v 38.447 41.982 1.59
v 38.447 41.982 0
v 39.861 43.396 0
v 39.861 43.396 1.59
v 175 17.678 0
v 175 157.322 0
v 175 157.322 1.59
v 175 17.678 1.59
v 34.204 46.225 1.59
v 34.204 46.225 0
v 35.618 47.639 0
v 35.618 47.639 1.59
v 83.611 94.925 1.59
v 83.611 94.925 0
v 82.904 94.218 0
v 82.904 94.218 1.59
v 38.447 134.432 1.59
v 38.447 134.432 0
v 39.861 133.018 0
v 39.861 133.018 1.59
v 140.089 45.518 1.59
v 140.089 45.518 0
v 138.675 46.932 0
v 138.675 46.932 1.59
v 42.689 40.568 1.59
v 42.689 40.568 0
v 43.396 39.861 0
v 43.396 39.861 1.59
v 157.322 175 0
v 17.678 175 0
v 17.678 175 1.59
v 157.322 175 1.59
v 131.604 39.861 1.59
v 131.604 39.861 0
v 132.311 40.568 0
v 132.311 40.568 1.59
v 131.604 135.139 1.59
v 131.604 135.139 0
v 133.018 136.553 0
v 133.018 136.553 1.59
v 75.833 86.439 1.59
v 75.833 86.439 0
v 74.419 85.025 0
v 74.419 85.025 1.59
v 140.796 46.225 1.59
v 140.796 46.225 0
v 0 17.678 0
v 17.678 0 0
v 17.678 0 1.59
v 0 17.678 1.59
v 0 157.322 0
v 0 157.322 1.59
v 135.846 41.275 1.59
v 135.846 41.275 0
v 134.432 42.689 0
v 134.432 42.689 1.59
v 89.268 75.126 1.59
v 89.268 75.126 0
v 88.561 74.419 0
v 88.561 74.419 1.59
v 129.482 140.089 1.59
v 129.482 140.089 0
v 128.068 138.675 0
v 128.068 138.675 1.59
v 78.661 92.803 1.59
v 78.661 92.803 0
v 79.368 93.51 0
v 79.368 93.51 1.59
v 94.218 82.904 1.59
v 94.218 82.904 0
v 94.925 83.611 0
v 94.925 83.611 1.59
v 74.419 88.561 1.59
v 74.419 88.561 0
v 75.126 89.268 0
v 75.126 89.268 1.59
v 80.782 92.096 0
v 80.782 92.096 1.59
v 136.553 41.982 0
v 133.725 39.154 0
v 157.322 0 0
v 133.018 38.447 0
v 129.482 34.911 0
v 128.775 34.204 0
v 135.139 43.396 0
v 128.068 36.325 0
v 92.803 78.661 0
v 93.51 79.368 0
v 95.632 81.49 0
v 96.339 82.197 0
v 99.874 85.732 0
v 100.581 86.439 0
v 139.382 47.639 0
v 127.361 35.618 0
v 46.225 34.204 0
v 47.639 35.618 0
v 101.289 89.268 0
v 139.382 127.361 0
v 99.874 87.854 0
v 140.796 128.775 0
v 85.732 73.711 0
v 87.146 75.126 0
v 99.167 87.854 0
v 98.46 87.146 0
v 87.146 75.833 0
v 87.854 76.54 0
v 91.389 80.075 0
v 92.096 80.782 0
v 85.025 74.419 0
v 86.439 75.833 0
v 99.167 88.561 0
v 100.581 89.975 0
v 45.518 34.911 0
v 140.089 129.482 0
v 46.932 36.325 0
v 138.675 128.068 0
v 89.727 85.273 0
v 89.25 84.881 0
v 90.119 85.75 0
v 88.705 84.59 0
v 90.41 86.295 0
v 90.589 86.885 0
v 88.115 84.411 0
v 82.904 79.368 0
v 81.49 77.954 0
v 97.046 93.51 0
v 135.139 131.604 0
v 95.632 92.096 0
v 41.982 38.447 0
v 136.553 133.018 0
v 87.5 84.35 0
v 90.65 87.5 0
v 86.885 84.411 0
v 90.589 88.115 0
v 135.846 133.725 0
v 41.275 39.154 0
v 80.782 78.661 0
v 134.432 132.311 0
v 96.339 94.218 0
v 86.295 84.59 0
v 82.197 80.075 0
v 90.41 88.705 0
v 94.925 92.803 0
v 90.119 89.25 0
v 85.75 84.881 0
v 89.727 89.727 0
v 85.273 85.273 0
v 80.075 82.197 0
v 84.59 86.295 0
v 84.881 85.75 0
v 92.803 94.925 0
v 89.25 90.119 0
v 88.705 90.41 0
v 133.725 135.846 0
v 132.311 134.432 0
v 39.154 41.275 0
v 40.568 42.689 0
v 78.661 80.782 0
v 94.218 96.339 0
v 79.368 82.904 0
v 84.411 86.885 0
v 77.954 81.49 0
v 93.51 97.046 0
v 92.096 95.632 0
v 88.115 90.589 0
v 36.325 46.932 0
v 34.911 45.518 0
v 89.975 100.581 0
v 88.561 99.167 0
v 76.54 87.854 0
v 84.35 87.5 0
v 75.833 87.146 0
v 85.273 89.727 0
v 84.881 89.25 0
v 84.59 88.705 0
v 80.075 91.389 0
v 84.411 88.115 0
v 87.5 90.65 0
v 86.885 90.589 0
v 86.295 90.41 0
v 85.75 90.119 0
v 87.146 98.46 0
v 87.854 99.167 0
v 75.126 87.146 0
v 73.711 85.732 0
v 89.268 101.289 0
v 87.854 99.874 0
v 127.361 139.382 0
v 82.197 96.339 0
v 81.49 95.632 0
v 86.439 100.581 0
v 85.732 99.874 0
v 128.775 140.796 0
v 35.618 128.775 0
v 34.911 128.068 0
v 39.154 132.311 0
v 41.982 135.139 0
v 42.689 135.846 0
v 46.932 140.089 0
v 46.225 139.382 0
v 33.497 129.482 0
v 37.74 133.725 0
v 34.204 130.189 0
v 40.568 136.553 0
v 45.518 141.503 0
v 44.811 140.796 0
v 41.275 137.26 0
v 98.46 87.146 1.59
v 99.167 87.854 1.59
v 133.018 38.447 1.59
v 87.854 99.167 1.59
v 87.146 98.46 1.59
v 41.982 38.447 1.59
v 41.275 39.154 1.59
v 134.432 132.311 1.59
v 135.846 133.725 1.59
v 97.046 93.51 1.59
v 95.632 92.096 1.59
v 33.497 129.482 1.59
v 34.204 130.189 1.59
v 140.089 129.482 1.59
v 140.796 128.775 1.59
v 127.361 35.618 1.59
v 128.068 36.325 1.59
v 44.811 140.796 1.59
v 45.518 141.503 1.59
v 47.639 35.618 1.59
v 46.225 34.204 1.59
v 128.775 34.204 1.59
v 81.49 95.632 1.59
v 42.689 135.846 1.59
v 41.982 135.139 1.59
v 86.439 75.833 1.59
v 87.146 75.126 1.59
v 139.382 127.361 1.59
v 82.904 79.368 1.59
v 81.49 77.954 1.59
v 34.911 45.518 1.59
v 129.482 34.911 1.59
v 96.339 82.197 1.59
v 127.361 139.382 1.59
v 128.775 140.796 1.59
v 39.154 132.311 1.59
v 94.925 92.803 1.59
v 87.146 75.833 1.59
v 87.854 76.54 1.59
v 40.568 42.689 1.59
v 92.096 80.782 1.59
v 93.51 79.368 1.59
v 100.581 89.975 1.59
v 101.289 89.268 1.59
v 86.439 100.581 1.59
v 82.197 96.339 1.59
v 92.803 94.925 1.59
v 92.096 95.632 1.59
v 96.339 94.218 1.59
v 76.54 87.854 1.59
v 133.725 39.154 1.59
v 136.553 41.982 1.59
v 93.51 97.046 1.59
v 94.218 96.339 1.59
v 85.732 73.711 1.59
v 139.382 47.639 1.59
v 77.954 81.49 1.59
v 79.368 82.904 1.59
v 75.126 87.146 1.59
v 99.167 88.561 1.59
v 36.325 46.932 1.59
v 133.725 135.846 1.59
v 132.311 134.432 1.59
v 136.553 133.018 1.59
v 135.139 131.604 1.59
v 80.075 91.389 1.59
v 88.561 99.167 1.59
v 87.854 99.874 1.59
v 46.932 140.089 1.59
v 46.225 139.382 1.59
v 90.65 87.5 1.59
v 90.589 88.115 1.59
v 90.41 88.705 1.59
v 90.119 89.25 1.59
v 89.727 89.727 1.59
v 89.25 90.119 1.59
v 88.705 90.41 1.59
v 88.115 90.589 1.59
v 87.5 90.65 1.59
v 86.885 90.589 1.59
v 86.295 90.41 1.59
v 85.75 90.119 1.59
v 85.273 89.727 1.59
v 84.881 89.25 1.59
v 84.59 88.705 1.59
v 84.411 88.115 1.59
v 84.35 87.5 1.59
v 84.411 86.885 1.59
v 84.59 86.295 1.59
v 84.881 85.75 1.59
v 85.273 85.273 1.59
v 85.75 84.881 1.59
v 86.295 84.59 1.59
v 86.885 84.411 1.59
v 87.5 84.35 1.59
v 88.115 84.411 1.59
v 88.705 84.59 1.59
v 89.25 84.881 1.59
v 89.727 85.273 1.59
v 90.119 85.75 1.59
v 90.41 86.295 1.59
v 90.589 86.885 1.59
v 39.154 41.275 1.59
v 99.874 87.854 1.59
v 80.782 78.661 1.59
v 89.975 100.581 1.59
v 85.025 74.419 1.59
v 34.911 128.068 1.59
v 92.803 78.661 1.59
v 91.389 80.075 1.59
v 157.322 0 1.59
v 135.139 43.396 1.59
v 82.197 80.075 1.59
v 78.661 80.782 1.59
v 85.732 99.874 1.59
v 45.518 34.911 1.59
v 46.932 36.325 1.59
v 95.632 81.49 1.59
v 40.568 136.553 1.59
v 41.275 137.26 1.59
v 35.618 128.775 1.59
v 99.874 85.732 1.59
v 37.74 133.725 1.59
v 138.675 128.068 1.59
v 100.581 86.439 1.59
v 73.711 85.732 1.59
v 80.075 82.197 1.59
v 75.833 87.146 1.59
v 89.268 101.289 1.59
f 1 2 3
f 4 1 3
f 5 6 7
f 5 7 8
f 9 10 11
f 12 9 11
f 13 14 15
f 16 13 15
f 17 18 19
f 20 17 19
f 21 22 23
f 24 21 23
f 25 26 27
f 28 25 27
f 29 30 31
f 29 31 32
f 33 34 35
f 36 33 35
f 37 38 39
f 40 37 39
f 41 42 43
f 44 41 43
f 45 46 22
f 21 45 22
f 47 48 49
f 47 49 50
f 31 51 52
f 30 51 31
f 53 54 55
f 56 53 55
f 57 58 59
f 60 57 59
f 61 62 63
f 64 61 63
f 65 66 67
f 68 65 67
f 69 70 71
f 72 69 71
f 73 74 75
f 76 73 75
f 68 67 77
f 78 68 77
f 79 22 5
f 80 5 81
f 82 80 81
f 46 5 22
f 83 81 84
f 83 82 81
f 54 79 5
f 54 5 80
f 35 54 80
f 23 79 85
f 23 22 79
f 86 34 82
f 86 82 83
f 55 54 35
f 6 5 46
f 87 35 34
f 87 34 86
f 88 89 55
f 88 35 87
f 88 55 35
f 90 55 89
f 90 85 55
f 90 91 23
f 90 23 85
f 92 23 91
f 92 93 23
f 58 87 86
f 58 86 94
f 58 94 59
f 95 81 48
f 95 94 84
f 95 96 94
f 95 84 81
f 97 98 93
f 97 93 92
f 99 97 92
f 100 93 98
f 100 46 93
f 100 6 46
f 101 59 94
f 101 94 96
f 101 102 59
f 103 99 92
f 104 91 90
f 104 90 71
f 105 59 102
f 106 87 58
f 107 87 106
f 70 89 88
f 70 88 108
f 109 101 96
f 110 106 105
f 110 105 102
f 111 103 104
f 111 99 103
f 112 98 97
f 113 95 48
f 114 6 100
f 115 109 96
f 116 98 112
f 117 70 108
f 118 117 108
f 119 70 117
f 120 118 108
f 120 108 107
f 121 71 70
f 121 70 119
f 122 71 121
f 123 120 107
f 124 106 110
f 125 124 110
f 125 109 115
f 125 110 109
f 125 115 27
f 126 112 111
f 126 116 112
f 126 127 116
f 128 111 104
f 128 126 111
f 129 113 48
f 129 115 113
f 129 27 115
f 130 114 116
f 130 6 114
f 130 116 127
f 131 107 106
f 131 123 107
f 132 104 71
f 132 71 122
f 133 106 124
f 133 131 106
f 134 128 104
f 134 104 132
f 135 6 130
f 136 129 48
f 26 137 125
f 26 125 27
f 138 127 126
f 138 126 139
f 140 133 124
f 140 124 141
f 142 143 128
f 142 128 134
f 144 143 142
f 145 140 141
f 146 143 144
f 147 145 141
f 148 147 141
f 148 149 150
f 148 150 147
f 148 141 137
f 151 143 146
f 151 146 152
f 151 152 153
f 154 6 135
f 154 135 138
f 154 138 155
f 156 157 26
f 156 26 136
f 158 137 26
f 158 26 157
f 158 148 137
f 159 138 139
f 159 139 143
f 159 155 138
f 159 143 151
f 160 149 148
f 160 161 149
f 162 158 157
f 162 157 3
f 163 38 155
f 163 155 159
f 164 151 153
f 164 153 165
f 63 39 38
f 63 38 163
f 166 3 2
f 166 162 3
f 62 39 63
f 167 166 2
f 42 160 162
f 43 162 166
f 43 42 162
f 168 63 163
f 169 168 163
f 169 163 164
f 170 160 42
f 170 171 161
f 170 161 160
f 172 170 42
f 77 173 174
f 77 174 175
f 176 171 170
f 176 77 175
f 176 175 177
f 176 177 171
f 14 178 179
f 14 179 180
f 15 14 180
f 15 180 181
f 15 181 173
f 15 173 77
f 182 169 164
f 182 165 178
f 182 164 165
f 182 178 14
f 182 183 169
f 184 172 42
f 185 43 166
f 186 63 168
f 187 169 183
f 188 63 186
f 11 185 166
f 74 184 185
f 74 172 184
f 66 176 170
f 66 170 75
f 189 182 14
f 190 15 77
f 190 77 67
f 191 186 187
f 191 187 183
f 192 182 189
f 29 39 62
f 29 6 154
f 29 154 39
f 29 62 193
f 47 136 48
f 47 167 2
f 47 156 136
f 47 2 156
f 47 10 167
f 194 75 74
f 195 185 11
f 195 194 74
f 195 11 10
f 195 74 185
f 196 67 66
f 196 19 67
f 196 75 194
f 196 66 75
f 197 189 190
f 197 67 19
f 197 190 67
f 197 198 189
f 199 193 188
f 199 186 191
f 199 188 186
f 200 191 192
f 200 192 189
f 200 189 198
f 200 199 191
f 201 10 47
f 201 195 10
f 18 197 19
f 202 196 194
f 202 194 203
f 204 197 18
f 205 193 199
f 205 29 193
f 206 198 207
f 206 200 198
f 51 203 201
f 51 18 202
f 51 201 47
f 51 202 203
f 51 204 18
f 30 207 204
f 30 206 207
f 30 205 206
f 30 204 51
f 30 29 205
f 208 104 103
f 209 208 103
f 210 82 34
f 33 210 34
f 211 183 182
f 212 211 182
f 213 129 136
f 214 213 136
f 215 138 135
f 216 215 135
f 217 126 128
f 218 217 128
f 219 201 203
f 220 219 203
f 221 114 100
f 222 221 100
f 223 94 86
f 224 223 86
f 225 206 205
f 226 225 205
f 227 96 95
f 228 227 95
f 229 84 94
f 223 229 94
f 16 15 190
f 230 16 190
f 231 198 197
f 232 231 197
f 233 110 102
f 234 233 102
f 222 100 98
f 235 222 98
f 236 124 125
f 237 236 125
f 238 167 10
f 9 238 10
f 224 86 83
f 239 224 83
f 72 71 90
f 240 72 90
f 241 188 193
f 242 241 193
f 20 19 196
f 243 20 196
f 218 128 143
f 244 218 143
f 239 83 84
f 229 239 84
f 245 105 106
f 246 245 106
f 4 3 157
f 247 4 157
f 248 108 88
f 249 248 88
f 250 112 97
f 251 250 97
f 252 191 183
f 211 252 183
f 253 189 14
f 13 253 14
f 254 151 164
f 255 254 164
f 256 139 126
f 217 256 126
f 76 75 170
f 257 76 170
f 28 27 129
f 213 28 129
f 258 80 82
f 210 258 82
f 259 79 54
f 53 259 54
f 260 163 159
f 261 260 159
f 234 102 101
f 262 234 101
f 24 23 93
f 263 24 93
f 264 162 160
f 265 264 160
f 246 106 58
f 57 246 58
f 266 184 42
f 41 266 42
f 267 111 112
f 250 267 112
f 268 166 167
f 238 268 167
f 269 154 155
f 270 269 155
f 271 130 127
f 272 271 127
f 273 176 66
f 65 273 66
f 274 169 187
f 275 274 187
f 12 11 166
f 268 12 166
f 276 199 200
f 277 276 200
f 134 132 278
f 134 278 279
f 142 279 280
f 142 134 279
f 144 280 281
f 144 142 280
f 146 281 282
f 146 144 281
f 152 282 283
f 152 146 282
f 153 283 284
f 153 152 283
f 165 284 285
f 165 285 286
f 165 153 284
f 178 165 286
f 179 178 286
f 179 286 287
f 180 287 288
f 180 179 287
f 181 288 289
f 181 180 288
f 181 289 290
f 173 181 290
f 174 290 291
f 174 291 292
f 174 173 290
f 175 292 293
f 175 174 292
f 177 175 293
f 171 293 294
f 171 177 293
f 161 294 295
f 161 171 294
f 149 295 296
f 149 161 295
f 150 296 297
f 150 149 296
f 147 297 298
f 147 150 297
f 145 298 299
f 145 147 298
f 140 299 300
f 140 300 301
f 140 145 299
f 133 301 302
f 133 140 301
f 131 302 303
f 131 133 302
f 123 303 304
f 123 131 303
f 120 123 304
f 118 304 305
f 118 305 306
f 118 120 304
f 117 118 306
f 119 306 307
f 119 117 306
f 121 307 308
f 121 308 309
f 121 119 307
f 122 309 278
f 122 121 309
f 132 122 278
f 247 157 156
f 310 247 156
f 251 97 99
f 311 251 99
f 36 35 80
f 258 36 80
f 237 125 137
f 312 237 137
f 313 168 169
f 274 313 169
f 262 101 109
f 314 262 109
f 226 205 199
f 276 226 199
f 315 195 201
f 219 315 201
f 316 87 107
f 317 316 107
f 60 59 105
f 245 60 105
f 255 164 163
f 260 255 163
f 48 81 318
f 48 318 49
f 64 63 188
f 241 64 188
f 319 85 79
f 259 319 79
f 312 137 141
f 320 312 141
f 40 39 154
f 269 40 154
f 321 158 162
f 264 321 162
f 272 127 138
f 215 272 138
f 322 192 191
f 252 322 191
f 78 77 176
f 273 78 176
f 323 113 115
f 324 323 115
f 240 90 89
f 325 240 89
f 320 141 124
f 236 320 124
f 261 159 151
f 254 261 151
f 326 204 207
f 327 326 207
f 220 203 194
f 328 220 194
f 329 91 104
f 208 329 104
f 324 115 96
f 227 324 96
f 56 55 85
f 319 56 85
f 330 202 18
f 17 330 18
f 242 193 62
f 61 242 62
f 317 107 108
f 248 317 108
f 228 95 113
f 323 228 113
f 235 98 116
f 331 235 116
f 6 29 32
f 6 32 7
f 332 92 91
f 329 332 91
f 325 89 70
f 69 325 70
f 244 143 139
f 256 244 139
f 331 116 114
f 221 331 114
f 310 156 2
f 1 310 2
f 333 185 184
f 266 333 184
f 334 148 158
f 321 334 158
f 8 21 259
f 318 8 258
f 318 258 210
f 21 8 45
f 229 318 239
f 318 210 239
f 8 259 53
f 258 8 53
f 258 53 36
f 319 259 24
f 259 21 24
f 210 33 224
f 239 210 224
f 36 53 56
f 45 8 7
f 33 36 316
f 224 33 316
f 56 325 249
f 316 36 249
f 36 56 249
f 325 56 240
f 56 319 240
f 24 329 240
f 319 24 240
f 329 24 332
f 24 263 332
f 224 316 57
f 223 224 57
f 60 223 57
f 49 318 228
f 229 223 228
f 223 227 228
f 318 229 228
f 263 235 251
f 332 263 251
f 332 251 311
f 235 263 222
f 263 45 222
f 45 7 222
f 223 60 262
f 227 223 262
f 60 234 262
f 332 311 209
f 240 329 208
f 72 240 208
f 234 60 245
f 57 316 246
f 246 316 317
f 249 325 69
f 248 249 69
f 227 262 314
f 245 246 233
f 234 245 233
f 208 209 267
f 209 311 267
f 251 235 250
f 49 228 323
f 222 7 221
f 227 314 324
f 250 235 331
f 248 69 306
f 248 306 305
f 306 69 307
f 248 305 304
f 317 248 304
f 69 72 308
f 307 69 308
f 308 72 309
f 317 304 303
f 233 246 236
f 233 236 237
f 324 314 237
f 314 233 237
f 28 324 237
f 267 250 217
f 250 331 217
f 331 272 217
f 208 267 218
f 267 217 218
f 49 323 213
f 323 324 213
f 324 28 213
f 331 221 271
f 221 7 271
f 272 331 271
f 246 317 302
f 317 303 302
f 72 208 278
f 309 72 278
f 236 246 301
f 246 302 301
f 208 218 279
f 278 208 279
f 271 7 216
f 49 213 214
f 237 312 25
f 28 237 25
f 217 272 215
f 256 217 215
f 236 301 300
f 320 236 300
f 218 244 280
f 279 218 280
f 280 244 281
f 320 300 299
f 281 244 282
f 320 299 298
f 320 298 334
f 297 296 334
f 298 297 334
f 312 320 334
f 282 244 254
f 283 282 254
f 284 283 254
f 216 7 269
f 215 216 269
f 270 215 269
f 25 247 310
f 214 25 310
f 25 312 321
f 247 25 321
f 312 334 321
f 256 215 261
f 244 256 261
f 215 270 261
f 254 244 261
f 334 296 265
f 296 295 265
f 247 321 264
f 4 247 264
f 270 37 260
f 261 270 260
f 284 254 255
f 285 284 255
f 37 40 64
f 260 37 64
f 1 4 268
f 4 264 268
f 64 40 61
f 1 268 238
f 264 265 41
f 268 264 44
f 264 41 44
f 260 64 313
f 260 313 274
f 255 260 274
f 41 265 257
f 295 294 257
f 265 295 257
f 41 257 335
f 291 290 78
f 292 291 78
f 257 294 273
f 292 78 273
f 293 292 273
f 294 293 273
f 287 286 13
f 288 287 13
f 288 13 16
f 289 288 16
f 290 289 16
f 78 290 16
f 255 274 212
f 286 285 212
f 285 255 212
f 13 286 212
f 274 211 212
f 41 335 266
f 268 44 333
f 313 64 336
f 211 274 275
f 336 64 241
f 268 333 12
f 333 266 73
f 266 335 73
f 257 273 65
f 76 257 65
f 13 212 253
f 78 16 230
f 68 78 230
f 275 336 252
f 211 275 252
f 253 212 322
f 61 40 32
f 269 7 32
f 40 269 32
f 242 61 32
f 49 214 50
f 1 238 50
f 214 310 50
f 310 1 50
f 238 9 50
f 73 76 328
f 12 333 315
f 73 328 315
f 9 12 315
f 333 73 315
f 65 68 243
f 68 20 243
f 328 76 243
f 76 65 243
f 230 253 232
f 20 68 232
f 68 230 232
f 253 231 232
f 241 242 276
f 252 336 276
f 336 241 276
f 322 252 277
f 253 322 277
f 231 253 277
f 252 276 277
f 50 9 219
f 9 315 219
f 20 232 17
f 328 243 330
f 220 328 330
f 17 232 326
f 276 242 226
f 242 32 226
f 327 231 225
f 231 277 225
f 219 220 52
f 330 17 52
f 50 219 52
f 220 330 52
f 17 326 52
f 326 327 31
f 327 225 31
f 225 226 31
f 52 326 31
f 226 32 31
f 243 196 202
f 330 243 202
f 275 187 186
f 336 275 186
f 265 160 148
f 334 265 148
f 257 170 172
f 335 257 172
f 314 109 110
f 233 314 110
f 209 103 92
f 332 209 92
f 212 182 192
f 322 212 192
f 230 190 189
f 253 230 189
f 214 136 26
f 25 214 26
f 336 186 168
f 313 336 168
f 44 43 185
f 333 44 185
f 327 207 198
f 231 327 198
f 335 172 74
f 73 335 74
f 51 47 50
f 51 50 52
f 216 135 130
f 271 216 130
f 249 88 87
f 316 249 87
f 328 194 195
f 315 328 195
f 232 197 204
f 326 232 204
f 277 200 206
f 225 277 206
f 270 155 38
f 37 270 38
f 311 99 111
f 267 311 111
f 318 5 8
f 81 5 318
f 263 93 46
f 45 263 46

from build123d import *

# Parameters (mm, degrees)
MODEL_R             = 3.15
BOSS_EXTRUDE1_DEPTH = 1.59


with BuildPart() as part:
    # Model → Boss-Extrude1 (new body)
    with BuildSketch(Plane.XY):
        Polygon((0, 17.67766953), (0, 157.32233047), (17.67766953, 175), (157.32233047, 175), (175, 157.32233047), (175, 17.67766953), (157.32233047, 0), (17.67766953, 0), align=None)
        with Locations((87.5, 87.5)):
            Circle(MODEL_R, mode=Mode.SUBTRACT)
        Polygon((139.381727984, 47.639087297), (140.795941546, 46.224873734), (140.088834765, 45.517766953), (138.674621202, 46.931980515), align=None, mode=Mode.SUBTRACT)
        Polygon((135.139087297, 43.396446609), (136.553300859, 41.982233047), (135.846194078, 41.275126266), (134.431980515, 42.689339828), align=None, mode=Mode.SUBTRACT)
        Polygon((132.310660172, 40.568019485), (133.724873734, 39.153805922), (133.017766953, 38.446699141), (131.603553391, 39.860912703), align=None, mode=Mode.SUBTRACT)
        Polygon((128.068019485, 36.325378798), (129.482233047, 34.911165235), (128.775126266, 34.204058454), (127.360912703, 35.618272016), align=None, mode=Mode.SUBTRACT)
        Polygon((87.853553391, 76.539844892), (89.267766953, 75.125631329), (88.560660172, 74.418524548), (87.146446609, 75.83273811), align=None, mode=Mode.SUBTRACT)
        Polygon((92.096194078, 80.782485579), (93.51040764, 79.368272016), (92.803300859, 78.661165235), (91.389087297, 80.075378798), align=None, mode=Mode.SUBTRACT)
        Polygon((47.639087297, 35.618272016), (46.224873734, 34.204058454), (45.517766953, 34.911165235), (46.931980515, 36.325378798), align=None, mode=Mode.SUBTRACT)
        Polygon((43.396446609, 39.860912703), (41.982233047, 38.446699141), (41.275126266, 39.153805922), (42.689339828, 40.568019485), align=None, mode=Mode.SUBTRACT)
        Polygon((40.568019485, 42.689339828), (39.153805922, 41.275126266), (38.446699141, 41.982233047), (39.860912703, 43.396446609), align=None, mode=Mode.SUBTRACT)
        Polygon((36.325378798, 46.931980515), (34.911165235, 45.517766953), (34.204058454, 46.224873734), (35.618272016, 47.639087297), align=None, mode=Mode.SUBTRACT)
        Polygon((75.83273811, 86.439339828), (74.418524548, 85.025126266), (73.711417767, 85.732233047), (75.125631329, 87.146446609), align=None, mode=Mode.SUBTRACT)
        Polygon((80.075378798, 82.196699141), (78.661165235, 80.782485579), (77.954058454, 81.48959236), (79.368272016, 82.903805922), align=None, mode=Mode.SUBTRACT)
        Polygon((82.903805922, 79.368272016), (81.48959236, 77.954058454), (80.782485579, 78.661165235), (82.196699141, 80.075378798), align=None, mode=Mode.SUBTRACT)
        Polygon((87.146446609, 75.125631329), (85.732233047, 73.711417767), (85.025126266, 74.418524548), (86.439339828, 75.83273811), align=None, mode=Mode.SUBTRACT)
        Polygon((101.288582233, 89.267766953), (99.874368671, 87.853553391), (99.16726189, 88.560660172), (100.581475452, 89.974873734), align=None, mode=Mode.SUBTRACT)
        Polygon((97.045941546, 93.51040764), (95.631727984, 92.096194078), (94.924621202, 92.803300859), (96.338834765, 94.217514421), align=None, mode=Mode.SUBTRACT)
        Polygon((94.217514421, 96.338834765), (92.803300859, 94.924621202), (92.096194078, 95.631727984), (93.51040764, 97.045941546), align=None, mode=Mode.SUBTRACT)
        Polygon((89.974873734, 100.581475452), (88.560660172, 99.16726189), (87.853553391, 99.874368671), (89.267766953, 101.288582233), align=None, mode=Mode.SUBTRACT)
        Polygon((129.482233047, 140.088834765), (128.068019485, 138.674621202), (127.360912703, 139.381727984), (128.775126266, 140.795941546), align=None, mode=Mode.SUBTRACT)
        Polygon((133.724873734, 135.846194078), (132.310660172, 134.431980515), (131.603553391, 135.139087297), (133.017766953, 136.553300859), align=None, mode=Mode.SUBTRACT)
        Polygon((136.553300859, 133.017766953), (135.139087297, 131.603553391), (134.431980515, 132.310660172), (135.846194078, 133.724873734), align=None, mode=Mode.SUBTRACT)
        Polygon((140.795941546, 128.775126266), (139.381727984, 127.360912703), (138.674621202, 128.068019485), (140.088834765, 129.482233047), align=None, mode=Mode.SUBTRACT)
        Polygon((94.924621202, 83.610912703), (96.338834765, 82.196699141), (95.631727984, 81.48959236), (94.217514421, 82.903805922), align=None, mode=Mode.SUBTRACT)
        Polygon((99.16726189, 87.853553391), (100.581475452, 86.439339828), (99.874368671, 85.732233047), (98.460155108, 87.146446609), align=None, mode=Mode.SUBTRACT)
        Polygon((75.125631329, 89.267766953), (76.539844892, 87.853553391), (75.83273811, 87.146446609), (74.418524548, 88.560660172), align=None, mode=Mode.SUBTRACT)
        Polygon((79.368272016, 93.51040764), (80.782485579, 92.096194078), (80.075378798, 91.389087297), (78.661165235, 92.803300859), align=None, mode=Mode.SUBTRACT)
        Polygon((82.196699141, 96.338834765), (83.610912703, 94.924621202), (82.903805922, 94.217514421), (81.48959236, 95.631727984), align=None, mode=Mode.SUBTRACT)
        Polygon((86.439339828, 100.581475452), (87.853553391, 99.16726189), (87.146446609, 98.460155108), (85.732233047, 99.874368671), align=None, mode=Mode.SUBTRACT)
        Polygon((34.204058454, 130.189339828), (35.618272016, 128.775126266), (34.911165235, 128.068019485), (33.496951673, 129.482233047), align=None, mode=Mode.SUBTRACT)
        Polygon((38.446699141, 134.431980515), (39.860912703, 133.017766953), (39.153805922, 132.310660172), (37.73959236, 133.724873734), align=None, mode=Mode.SUBTRACT)
        Polygon((41.275126266, 137.26040764), (42.689339828, 135.846194078), (41.982233047, 135.139087297), (40.568019485, 136.553300859), align=None, mode=Mode.SUBTRACT)
        Polygon((45.517766953, 141.503048327), (46.931980515, 140.088834765), (46.224873734, 139.381727984), (44.810660172, 140.795941546), align=None, mode=Mode.SUBTRACT)
    extrude(amount=BOSS_EXTRUDE1_DEPTH)


solid = part.part
